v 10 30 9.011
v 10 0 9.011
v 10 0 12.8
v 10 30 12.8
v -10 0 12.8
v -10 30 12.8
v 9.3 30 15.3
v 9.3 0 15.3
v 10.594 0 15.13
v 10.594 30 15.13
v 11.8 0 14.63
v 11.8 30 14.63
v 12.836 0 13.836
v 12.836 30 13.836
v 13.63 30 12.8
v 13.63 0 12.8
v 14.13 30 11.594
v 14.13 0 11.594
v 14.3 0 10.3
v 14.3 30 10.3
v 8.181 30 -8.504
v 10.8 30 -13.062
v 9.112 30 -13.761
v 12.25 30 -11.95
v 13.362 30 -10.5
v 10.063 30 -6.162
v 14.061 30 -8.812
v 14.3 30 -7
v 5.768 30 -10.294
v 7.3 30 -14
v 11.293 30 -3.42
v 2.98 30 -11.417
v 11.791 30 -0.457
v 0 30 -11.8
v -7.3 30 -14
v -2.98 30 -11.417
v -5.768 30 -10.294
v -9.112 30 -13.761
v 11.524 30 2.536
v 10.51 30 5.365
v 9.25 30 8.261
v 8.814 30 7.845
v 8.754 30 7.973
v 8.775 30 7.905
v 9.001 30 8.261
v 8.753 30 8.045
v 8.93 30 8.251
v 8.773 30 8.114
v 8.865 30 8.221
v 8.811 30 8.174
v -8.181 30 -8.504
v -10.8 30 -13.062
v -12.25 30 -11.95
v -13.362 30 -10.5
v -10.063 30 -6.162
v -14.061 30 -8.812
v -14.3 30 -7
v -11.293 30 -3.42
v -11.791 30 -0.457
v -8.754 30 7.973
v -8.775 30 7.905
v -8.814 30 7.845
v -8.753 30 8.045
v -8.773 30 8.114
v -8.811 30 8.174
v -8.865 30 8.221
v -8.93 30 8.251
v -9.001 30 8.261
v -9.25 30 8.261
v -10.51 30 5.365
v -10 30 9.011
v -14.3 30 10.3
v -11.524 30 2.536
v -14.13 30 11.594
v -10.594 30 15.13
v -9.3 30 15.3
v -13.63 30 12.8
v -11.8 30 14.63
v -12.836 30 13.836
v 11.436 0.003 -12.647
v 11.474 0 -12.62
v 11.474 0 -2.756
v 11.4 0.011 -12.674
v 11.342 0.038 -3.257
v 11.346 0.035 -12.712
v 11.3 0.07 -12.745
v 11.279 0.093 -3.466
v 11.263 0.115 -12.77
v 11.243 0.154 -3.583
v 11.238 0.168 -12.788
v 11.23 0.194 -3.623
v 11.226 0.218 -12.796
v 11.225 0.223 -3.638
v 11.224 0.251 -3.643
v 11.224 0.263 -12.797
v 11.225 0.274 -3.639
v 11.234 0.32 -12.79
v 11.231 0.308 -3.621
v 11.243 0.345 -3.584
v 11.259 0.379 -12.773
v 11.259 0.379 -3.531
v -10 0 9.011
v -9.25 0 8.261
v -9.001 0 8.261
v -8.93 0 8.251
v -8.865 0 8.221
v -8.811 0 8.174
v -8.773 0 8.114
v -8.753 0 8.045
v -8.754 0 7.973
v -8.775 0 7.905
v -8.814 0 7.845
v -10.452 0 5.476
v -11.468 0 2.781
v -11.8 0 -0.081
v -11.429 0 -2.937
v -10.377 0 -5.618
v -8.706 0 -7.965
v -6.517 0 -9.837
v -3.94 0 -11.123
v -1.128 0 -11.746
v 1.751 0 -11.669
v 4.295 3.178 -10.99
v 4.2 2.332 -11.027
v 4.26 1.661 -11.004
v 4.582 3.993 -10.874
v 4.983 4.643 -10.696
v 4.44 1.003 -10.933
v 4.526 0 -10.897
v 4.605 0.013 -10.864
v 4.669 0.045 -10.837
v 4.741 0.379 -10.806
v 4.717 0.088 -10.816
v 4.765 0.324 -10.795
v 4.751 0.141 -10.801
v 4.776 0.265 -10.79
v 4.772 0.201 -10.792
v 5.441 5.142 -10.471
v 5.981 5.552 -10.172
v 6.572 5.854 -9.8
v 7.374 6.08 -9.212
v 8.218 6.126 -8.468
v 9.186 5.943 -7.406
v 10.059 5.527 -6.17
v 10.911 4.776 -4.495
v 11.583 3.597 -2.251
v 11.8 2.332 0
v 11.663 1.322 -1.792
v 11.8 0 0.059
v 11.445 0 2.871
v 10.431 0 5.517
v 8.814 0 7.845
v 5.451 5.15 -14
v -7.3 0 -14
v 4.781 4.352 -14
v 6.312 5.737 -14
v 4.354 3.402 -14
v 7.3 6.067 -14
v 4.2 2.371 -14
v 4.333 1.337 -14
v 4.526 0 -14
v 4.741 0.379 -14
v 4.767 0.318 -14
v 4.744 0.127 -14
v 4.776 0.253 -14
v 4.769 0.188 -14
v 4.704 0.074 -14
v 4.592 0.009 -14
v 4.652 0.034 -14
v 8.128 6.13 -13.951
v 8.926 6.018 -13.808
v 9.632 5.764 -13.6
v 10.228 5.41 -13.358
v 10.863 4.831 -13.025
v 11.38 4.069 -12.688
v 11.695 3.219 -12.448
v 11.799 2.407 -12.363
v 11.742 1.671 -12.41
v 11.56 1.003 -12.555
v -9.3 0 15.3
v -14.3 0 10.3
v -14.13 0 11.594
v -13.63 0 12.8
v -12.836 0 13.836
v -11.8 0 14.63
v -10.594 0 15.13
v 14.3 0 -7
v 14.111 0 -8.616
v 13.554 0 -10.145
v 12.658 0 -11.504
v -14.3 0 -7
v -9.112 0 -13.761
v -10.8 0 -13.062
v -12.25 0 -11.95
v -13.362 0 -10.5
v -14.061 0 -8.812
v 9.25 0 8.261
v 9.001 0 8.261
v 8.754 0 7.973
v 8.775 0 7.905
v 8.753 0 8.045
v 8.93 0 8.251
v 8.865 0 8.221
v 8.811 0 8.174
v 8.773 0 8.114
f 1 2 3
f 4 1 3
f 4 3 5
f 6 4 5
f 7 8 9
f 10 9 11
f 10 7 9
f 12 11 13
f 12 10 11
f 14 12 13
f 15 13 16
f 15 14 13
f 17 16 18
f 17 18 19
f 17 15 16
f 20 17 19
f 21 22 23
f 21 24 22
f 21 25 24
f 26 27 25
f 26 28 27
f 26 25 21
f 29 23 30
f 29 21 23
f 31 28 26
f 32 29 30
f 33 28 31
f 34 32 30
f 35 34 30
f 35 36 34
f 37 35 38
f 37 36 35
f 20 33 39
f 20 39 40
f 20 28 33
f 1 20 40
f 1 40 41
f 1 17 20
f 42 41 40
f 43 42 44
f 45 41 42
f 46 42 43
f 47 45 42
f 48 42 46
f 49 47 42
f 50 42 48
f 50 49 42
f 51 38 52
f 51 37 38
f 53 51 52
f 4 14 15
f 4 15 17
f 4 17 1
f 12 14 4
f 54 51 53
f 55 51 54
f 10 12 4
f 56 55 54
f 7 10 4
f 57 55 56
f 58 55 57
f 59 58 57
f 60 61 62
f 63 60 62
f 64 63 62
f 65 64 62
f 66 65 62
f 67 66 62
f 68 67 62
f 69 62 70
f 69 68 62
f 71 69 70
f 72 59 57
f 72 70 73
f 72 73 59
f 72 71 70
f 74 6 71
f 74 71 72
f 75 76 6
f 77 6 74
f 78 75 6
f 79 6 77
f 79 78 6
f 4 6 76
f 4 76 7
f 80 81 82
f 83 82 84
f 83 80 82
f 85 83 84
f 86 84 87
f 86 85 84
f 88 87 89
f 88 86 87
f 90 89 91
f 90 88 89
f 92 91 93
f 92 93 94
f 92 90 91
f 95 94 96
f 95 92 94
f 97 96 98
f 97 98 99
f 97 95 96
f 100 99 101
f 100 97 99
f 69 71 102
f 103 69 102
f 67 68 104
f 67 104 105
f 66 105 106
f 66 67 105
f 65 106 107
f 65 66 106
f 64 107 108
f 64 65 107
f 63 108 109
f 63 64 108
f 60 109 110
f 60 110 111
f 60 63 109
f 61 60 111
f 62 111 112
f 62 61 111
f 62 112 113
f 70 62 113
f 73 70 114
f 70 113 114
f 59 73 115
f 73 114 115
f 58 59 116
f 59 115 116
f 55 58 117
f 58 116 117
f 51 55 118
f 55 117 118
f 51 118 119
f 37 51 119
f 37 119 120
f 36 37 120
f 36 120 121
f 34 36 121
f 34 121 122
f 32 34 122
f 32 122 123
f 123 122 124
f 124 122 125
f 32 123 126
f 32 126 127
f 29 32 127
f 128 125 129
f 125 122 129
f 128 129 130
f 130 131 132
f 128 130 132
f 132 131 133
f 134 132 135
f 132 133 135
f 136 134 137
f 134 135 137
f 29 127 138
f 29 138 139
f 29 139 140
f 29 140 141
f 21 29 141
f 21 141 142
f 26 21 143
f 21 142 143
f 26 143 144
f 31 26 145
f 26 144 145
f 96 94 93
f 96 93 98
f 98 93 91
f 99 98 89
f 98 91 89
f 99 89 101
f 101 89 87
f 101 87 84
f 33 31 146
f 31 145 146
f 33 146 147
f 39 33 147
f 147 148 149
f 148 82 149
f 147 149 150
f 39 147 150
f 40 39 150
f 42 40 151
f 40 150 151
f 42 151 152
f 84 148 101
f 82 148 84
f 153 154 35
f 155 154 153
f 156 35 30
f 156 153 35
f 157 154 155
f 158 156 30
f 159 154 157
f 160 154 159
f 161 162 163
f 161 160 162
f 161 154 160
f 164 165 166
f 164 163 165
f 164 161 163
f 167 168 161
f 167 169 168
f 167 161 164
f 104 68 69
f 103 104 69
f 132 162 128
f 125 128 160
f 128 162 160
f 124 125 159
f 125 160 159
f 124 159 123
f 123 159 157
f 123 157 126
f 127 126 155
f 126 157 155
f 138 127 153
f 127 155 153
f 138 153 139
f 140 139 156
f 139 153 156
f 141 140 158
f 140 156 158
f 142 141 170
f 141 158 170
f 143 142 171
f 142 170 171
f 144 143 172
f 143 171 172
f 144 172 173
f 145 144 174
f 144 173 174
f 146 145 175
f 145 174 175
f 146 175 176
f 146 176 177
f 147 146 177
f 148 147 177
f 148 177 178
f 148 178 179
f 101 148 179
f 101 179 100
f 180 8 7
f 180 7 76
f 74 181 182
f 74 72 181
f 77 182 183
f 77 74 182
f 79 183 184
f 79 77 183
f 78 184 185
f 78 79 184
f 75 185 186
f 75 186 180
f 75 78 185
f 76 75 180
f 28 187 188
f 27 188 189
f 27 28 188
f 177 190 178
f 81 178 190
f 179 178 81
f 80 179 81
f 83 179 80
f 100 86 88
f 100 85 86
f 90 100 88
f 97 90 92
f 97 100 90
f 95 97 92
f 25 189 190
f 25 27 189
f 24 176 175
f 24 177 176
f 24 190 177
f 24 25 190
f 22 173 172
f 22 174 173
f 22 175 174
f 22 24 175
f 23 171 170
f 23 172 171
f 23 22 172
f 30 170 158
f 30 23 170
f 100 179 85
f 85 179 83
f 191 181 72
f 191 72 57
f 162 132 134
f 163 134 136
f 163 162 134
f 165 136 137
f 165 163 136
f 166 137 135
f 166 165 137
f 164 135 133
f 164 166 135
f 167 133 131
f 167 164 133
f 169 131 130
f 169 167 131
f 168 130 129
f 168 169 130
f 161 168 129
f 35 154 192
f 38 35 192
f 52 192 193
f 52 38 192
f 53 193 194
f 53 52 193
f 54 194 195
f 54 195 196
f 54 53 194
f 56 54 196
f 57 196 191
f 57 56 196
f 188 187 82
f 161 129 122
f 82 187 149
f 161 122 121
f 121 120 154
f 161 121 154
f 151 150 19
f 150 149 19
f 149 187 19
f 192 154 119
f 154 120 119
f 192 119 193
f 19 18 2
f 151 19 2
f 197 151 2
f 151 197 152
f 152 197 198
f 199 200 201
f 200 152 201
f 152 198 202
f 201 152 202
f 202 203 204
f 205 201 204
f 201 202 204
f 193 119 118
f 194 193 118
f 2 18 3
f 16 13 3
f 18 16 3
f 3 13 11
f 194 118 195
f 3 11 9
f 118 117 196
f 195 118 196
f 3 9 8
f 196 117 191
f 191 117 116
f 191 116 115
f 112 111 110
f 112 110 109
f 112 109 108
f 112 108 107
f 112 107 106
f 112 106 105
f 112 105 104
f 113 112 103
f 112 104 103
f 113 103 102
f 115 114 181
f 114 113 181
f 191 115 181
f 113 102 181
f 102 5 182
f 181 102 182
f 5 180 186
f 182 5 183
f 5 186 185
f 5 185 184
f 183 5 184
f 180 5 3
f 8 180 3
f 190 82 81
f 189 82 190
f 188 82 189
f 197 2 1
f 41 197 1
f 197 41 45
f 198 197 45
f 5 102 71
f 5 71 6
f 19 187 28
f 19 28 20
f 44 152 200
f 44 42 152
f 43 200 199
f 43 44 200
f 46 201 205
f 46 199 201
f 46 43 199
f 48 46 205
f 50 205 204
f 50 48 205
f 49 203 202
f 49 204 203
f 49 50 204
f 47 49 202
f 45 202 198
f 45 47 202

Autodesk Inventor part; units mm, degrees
ref_plane "YZ Plane" through (0, 0, 0) normal (1, 0, 0) x (0, 1, 0)
ref_plane "XZ Plane" through (0, 0, 0) normal (0, 1, 0) x (-1, 0, 0)
ref_plane "XY Plane" through (0, 0, 0) normal (0, 0, 1) x (1, 0, 0)
sketch "Sketch1" plane through (0, 0, 0) normal (0, 1, 0) x (-1, 0, 0)
  circle A0 centre (0, 0) radius 11.5
  circle A1 centre (0, 0) radius 11.8
  line L0 (10, 12.5) -> (-10, 12.5)
  line L1 (-10, 12.5) -> (-10, 8.2614)
  line L2 (-10, 8.2614) -> (10, 8.2614)
  line L3 (10, 8.2614) -> (10, 12.5)
  line L4 (10, 12.5) -> (-10, 8.2614) construction
  line L5 (-10, 12.5) -> (10, 8.2614) construction
  line L6 (0, 10.3807) -> (0, -11.5) construction
  line L7 (10, 12.5) -> (-10, 12.5)
  line L8 (-10, 12.5) -> (-10, 12.8)
  line L9 (-10, 12.8) -> (10, 12.8)
  line L10 (10, 12.8) -> (10, 12.5)
  line L11 (-14.3, 15.3) -> (14.3, 15.3)
  line L12 (14.3, 15.3) -> (14.3, -14)
  line L13 (14.3, -14) -> (-14.3, -14)
  line L14 (-14.3, -14) -> (-14.3, 15.3)
  point P0 (8, 8.2614)
  point P1 (-8, 8.2614)
  point P2 (0, -14)
  point P3 (8.4256, 8.2614)
  point P4 (-8.4256, 8.2614)
  dimension "d0" = 23
  dimension "d1" = 0.3
  dimension "d2" = 24
  dimension "d3" = 16
  dimension "d4" = 20
  dimension "d5" = 0.3
  dimension "d6" = 2.5
  dimension "d7" = 2.5
  dimension "d8" = 2.5
  dimension "d9" = 14.3
  dimension "d10" = 14.3
extrude "Extrusion1" add sketch "Sketch1" along normal blind 30
fillet "Fillet1" radius 0.25 2 edges at (8.4256, 15, 8.2614) (-8.4256, 15, 8.2614)
chamfer "Chamfer1" distance 0.75 angle 45 2 edges at (-10, 15, 8.2614) (10, 15, 8.2614)
sketch "Sketch2" plane through (14.3, 0, -14) normal (0, 0, -1) x (-1, 0, 0)
  line L0 (2.5, 30) -> (26.1, 30) projected
  line L1 (2.5, 30) -> (26.1, 30)
  line L2 (26.1, 30) -> (26.1, 0)
  line L3 (26.1, 0) -> (2.5, 0)
  line L4 (2.5, 0) -> (2.5, 30)
  line L5 (0, 0) -> (28.6, 0) projected
  circle A0 centre (6.3, 2.3324) radius 3.5
  circle A1 centre (6.3, 2.3324) radius 3.8
  line L6 (3.3, 0) -> (9.3, 0) construction
  line L7 (2.8, 0) -> (2.8, 30)
  point P0 (14.3, 0)
  point P1 (23.1144, 30)
  point P2 (5.4856, 30)
  point P3 (2.5, 2.3324)
  point P4 (3.6904, 0)
  point P5 (9.3, 0)
  point P6 (2.5, 2.3324)
  point P7 (2.5, 0.8525)
  point P8 (8.9096, 0)
  dimension "d17" = 7
  dimension "d18" = 0.3
  dimension "d20" = 6
  dimension "d25" = 0.3
extrude "Extrusion2" cut sketch "Sketch2" against normal up to surface contours A1 L7 | A1 L3 A0 L7 | L7 A0 L3 A1 | A0 L3 | L3 A0 A1 | L3 A0
fillet "Fillet2" radius 0.25 2 edges at (5, 0, -12.3442) (11, 0, -9.1354)
sketch "Sketch4" plane through (14.3, 30, -14) normal (0, 0, -1) x (-1, 0, 0)
  arc A0 (2.8264, -30) -> (3.0408, -29.6215) centre (2.8264, -29.75) ccw projected
  arc A1 (9.5592, -29.6215) -> (3.0408, -29.6215) centre (6.3, -27.6676) ccw projected
  arc A2 (9.5592, -29.6215) -> (9.7736, -30) centre (9.7736, -29.75) ccw projected
  line L0 (9.7736, -30) -> (28.6, -30) projected
  line L1 (28.6, -30) -> (28.6, 0) projected
  line L2 (0, 0) -> (28.6, 0) projected
  line L3 (0, -30) -> (0, 0) projected
  line L4 (0, -30) -> (2.8264, -30) projected
  line L5 (3.0764, -29.0955) -> (9.5236, -29.0955)
  line L6 (9.5236, -29.0955) -> (9.5236, -29.986)
  line L7 (9.5236, -29.986) -> (3.0764, -29.986)
  line L8 (3.0764, -29.986) -> (3.0764, -29.0955)
  arc A3 (9.5592, -29.6215) -> (9.7736, -30) centre (9.7736, -29.75) ccw projected
  point P0 (14.3, -30)
  dimension "d26" = 6.4473
fillet "Fillet3" radius 7 2 edges at (14.3, 15, -14) (-14.3, 15, -14)
fillet "Fillet4" radius 5 2 edges at (-14.3, 15, 15.3) (14.3, 15, 15.3)
sketch "Sketch5" plane through (0, 30, 0) normal (0, 1, 0) x (1, 0, 0)
  arc A0 (8.8144, -7.8451) -> (-8.8144, -7.8451) centre (0, 0) ccw projected
  line L0 (10, -12.8) -> (-10, -12.8) projected
  line L1 (-10, -12.8) -> (-10, -9.0114) projected
  line L2 (-9.25, -8.2614) -> (-10, -9.0114) projected
  line L3 (-9.25, -8.2614) -> (-9.0011, -8.2614) projected
  arc A1 (-9.0011, -8.2614) -> (-8.8144, -7.8451) centre (-9.0011, -8.0114) ccw projected
  line L4 (10, -9.0114) -> (10, -12.8) projected
  arc A2 (-9.0011, -8.2614) -> (-8.8144, -7.8451) centre (-9.0011, -8.0114) ccw projected
  arc A3 (8.8144, -7.8451) -> (-8.8144, -7.8451) centre (0, 0) ccw projected
  arc A4 (8.8144, -7.8451) -> (9.0011, -8.2614) centre (9.0011, -8.0114) ccw projected
  line L5 (9.0011, -8.2614) -> (9.25, -8.2614) projected
  line L6 (10, -9.0114) -> (9.25, -8.2614) projected
  line L7 (10, -9.0114) -> (10, -12.8) projected
  line L8 (10, -12.8) -> (-10, -12.8) projected
  line L9 (-10, -12.8) -> (-10, -9.0114) projected
  line L10 (-9.25, -8.2614) -> (-10, -9.0114) projected
  line L11 (-9.25, -8.2614) -> (-9.0011, -8.2614) projected
equation "\"d10\" = d9"
properties part number "mount"
